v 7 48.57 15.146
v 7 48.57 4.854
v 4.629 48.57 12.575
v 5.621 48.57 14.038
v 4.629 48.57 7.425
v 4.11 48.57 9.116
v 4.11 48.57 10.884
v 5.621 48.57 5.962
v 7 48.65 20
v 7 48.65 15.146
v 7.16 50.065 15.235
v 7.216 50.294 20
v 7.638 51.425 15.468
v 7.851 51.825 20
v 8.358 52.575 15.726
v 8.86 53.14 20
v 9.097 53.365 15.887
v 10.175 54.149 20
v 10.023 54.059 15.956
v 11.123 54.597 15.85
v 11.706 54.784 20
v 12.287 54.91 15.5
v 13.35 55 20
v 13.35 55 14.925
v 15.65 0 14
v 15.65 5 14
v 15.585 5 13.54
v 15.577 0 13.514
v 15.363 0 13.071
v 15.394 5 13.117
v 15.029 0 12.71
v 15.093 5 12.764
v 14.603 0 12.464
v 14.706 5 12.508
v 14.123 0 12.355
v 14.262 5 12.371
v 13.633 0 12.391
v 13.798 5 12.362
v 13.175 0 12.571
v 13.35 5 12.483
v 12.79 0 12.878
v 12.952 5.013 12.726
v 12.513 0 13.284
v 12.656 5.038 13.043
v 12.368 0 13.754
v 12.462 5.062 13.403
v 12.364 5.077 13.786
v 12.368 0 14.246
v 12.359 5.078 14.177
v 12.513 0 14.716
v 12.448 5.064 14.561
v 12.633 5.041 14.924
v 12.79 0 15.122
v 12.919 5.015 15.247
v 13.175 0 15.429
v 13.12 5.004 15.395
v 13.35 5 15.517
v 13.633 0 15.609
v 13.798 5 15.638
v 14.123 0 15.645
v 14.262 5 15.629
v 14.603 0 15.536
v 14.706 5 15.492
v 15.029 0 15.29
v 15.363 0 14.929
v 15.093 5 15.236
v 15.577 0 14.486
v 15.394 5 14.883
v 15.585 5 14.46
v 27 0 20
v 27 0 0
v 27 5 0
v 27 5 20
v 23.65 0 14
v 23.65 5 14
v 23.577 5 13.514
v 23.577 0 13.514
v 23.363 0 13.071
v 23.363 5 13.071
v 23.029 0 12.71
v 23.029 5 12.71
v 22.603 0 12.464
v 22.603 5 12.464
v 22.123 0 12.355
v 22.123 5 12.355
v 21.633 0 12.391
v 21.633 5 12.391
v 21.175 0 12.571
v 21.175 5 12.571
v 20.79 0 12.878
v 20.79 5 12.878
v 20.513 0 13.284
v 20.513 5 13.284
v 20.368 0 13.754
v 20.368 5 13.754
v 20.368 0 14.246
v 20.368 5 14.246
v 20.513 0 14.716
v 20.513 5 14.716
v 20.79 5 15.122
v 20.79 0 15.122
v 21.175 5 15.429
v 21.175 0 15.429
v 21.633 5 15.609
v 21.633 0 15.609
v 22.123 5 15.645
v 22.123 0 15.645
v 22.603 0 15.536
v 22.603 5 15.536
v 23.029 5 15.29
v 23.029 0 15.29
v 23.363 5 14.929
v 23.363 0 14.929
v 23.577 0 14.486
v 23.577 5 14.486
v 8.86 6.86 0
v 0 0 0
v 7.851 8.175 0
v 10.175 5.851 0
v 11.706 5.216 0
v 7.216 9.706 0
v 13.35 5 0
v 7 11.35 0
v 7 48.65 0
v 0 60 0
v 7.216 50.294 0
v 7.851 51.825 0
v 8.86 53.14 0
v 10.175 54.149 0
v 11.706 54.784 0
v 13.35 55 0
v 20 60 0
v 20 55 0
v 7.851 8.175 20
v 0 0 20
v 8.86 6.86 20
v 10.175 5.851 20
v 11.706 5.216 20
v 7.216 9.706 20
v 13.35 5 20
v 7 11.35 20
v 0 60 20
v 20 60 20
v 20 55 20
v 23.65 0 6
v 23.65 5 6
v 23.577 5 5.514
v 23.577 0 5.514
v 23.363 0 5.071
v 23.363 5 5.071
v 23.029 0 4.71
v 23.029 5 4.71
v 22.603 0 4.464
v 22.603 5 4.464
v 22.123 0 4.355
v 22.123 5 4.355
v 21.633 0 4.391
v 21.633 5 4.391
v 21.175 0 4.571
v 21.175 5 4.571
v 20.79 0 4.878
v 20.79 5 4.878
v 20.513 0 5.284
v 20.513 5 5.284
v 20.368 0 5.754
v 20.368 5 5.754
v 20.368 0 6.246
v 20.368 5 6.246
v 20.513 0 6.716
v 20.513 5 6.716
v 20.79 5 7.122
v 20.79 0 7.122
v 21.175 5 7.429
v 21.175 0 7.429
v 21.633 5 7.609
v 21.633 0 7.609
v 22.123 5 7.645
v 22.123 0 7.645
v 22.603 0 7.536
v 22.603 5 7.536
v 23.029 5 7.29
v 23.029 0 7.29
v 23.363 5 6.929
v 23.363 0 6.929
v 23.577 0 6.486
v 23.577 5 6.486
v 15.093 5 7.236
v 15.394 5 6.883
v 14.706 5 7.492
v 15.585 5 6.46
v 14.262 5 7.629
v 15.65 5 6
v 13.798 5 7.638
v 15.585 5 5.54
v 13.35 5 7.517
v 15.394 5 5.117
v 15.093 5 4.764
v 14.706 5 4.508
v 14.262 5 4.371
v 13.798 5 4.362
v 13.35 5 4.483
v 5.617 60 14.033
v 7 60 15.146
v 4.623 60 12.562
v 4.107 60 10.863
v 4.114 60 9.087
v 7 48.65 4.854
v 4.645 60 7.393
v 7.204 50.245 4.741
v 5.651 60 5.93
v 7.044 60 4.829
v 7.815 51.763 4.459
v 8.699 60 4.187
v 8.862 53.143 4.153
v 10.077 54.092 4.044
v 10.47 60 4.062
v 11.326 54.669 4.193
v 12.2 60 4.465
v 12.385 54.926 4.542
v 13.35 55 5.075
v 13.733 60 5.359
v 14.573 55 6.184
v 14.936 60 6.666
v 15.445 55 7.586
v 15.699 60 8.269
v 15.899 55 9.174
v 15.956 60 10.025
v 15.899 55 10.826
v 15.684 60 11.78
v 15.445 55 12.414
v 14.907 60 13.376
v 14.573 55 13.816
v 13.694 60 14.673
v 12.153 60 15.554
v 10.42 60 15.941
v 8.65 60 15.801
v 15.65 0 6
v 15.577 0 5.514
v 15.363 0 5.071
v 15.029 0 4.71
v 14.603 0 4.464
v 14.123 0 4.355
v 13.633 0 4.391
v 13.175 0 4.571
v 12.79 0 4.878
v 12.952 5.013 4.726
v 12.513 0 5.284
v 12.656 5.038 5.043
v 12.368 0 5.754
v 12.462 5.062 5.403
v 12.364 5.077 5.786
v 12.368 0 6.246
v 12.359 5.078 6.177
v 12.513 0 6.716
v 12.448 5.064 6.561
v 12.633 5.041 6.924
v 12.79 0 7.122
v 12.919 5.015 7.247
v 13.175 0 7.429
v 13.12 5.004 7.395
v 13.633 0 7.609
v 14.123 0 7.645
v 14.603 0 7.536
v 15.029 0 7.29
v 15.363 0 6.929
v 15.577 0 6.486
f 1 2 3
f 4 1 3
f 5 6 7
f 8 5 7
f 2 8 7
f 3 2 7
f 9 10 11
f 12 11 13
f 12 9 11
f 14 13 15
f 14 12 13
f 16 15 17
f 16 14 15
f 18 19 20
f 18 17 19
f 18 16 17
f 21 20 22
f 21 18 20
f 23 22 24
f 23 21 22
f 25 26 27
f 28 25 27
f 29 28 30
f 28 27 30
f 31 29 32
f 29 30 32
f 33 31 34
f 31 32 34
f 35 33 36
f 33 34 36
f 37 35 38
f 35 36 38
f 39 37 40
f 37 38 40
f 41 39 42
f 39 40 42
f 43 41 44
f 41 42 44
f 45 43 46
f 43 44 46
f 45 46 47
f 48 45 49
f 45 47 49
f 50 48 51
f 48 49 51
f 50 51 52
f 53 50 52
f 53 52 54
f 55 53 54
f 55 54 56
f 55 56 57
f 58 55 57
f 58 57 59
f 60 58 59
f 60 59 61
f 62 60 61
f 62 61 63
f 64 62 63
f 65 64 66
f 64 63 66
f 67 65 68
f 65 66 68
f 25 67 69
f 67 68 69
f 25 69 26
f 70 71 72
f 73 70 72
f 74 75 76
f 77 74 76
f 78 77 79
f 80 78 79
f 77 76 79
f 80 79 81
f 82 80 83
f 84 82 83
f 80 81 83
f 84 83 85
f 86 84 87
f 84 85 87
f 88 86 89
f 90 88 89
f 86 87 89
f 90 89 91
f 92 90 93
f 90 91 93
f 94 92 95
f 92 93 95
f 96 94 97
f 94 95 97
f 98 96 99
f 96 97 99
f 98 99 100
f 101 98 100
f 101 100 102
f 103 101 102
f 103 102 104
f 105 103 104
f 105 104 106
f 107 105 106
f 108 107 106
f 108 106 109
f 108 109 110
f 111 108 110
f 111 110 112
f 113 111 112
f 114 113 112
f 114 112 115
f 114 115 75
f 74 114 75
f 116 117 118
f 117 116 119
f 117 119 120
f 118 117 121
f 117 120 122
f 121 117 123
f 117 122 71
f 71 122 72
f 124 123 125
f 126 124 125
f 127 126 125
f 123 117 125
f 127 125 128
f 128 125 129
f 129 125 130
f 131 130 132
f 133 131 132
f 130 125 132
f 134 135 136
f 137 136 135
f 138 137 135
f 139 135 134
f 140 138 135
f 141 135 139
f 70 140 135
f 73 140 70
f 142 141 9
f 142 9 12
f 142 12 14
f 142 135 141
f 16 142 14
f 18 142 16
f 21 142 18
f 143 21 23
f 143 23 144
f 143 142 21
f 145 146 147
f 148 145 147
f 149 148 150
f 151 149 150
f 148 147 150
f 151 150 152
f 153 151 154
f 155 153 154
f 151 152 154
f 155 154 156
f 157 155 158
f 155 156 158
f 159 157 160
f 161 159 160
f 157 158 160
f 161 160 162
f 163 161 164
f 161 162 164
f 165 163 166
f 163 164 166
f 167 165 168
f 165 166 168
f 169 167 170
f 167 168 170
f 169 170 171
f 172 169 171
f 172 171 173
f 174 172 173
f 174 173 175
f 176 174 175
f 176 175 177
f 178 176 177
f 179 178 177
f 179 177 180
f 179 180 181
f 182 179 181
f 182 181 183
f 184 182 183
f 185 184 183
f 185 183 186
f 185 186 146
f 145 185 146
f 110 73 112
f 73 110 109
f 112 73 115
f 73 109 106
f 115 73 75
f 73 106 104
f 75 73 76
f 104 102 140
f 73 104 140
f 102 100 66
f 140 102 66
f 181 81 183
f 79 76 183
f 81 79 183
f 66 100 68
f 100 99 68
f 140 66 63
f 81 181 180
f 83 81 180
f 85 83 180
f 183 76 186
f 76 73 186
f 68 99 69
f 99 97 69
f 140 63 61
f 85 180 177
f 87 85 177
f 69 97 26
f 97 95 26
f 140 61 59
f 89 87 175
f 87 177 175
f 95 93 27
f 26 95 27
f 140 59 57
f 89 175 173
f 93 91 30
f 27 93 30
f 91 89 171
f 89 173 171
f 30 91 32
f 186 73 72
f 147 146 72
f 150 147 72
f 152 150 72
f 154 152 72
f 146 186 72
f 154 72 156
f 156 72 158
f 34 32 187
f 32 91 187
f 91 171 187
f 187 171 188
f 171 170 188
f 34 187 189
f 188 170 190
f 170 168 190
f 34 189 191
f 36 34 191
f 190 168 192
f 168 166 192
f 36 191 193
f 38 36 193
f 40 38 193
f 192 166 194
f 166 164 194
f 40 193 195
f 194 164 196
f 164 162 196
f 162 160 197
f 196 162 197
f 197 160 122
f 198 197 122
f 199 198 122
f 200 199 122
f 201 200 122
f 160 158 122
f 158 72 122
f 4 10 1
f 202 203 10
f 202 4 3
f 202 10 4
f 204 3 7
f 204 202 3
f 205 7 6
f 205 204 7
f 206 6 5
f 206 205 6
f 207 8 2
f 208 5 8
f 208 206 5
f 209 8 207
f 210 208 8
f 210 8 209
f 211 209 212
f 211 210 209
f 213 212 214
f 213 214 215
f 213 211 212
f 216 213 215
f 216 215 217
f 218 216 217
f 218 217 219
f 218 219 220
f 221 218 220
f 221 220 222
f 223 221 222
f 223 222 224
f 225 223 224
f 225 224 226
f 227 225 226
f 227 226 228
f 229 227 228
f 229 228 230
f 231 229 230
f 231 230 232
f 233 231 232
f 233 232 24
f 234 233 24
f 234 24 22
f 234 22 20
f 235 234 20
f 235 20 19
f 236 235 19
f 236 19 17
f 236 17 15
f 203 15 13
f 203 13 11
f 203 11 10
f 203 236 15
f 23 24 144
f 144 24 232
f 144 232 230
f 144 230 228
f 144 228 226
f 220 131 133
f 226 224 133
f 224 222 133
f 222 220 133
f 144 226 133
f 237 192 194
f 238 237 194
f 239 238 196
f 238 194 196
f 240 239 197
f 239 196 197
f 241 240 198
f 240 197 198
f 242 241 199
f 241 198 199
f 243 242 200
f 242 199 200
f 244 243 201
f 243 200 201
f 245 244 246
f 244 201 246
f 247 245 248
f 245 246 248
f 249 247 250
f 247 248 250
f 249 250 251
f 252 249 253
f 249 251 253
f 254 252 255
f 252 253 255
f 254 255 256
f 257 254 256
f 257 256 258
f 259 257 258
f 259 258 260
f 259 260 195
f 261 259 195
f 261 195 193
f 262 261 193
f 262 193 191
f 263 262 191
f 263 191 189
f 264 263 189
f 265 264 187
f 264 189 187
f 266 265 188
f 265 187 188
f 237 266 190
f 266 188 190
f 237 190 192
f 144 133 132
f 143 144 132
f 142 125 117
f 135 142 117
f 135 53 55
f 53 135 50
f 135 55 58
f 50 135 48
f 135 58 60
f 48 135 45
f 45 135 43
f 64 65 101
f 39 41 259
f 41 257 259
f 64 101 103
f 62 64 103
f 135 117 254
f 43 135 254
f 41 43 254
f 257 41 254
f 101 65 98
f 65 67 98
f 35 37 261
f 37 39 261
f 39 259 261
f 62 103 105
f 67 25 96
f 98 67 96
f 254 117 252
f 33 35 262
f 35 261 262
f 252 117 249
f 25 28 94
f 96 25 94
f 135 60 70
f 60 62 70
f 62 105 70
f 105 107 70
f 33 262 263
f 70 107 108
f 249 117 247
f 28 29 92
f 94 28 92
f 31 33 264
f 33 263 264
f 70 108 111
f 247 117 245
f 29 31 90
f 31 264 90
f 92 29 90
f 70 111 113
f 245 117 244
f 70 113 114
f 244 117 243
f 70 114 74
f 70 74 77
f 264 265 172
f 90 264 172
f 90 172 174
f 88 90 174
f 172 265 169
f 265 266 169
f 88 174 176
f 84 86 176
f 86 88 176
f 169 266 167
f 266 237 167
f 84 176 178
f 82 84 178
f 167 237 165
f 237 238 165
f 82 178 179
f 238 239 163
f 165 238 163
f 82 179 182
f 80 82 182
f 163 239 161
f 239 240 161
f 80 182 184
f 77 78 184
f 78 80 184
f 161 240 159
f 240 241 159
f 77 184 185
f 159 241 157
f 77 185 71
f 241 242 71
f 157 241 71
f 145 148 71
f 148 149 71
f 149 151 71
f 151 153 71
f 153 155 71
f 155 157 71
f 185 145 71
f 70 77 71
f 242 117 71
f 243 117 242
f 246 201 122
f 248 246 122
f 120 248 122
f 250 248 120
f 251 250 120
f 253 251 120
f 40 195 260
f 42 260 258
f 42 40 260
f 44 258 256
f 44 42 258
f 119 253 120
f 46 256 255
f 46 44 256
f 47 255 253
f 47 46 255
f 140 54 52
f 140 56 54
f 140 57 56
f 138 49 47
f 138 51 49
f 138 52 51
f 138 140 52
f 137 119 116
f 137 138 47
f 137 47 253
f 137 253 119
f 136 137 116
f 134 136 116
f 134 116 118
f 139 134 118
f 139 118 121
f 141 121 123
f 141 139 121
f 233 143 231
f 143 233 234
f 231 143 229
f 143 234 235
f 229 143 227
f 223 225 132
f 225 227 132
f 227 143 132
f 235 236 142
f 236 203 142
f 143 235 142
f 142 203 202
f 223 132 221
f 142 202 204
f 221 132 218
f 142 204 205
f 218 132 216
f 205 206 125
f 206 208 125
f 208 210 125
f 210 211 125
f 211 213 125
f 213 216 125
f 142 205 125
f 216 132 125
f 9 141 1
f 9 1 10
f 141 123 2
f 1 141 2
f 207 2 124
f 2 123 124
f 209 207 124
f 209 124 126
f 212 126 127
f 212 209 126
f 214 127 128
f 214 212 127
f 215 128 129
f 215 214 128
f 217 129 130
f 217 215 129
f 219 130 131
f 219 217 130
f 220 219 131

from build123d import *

# Parameters (mm, degrees)
BOSS_EXTRUDE1_DEPTH       = 20
FILLET1_R                 = 6.35
M4X0_7_TAPPED_HOLE1_D     = 3.3
M4X0_7_TAPPED_HOLE1_DEPTH = 10.1
M4X0_7_TAPPED_HOLE1_TIP   = 0.991420021
SKETCH5_R                 = 5.9563
CUT_EXTRUDE1_DEPTH        = 11.43


with BuildPart() as part:
    # Sketch1 → Boss-Extrude1 (new body)
    with BuildSketch(Plane.XY):
        Polygon((0, 0), (27, 0), (27, 5), (7, 5), (7, 55), (20, 55), (20, 60), (0, 60), align=None)
    extrude(amount=BOSS_EXTRUDE1_DEPTH)

    # Fillet1
    fillet1_edges = [part.edges().sort_by_distance(p)[0] for p in [
        (7, 55, 10),
        (7, 5, 10),
    ]]
    fillet(fillet1_edges, radius=FILLET1_R)

    # M4x0.7 Tapped Hole1
    with Locations(Plane(origin=(0, 0, 0), x_dir=(-1, 0, 0), z_dir=(0, -1, 0))):
        with Locations((-22, -14), (-22, -6), (-14, -6), (-14, -14)):
            Hole(M4X0_7_TAPPED_HOLE1_D / 2, depth=M4X0_7_TAPPED_HOLE1_DEPTH)
            with Locations((0, 0, -(M4X0_7_TAPPED_HOLE1_DEPTH + M4X0_7_TAPPED_HOLE1_TIP / 2))):  # 118° drill point
                Cone(0, M4X0_7_TAPPED_HOLE1_D / 2, M4X0_7_TAPPED_HOLE1_TIP, mode=Mode.SUBTRACT)

    # Sketch5 → Cut-Extrude1 (cut)
    with BuildSketch(Plane.XZ.offset(-60)):
        with Locations(Location((10, 10, 0), (0, 0, 120.242996609))):
            Circle(SKETCH5_R)
    extrude(amount=CUT_EXTRUDE1_DEPTH, mode=Mode.SUBTRACT)


solid = part.part
